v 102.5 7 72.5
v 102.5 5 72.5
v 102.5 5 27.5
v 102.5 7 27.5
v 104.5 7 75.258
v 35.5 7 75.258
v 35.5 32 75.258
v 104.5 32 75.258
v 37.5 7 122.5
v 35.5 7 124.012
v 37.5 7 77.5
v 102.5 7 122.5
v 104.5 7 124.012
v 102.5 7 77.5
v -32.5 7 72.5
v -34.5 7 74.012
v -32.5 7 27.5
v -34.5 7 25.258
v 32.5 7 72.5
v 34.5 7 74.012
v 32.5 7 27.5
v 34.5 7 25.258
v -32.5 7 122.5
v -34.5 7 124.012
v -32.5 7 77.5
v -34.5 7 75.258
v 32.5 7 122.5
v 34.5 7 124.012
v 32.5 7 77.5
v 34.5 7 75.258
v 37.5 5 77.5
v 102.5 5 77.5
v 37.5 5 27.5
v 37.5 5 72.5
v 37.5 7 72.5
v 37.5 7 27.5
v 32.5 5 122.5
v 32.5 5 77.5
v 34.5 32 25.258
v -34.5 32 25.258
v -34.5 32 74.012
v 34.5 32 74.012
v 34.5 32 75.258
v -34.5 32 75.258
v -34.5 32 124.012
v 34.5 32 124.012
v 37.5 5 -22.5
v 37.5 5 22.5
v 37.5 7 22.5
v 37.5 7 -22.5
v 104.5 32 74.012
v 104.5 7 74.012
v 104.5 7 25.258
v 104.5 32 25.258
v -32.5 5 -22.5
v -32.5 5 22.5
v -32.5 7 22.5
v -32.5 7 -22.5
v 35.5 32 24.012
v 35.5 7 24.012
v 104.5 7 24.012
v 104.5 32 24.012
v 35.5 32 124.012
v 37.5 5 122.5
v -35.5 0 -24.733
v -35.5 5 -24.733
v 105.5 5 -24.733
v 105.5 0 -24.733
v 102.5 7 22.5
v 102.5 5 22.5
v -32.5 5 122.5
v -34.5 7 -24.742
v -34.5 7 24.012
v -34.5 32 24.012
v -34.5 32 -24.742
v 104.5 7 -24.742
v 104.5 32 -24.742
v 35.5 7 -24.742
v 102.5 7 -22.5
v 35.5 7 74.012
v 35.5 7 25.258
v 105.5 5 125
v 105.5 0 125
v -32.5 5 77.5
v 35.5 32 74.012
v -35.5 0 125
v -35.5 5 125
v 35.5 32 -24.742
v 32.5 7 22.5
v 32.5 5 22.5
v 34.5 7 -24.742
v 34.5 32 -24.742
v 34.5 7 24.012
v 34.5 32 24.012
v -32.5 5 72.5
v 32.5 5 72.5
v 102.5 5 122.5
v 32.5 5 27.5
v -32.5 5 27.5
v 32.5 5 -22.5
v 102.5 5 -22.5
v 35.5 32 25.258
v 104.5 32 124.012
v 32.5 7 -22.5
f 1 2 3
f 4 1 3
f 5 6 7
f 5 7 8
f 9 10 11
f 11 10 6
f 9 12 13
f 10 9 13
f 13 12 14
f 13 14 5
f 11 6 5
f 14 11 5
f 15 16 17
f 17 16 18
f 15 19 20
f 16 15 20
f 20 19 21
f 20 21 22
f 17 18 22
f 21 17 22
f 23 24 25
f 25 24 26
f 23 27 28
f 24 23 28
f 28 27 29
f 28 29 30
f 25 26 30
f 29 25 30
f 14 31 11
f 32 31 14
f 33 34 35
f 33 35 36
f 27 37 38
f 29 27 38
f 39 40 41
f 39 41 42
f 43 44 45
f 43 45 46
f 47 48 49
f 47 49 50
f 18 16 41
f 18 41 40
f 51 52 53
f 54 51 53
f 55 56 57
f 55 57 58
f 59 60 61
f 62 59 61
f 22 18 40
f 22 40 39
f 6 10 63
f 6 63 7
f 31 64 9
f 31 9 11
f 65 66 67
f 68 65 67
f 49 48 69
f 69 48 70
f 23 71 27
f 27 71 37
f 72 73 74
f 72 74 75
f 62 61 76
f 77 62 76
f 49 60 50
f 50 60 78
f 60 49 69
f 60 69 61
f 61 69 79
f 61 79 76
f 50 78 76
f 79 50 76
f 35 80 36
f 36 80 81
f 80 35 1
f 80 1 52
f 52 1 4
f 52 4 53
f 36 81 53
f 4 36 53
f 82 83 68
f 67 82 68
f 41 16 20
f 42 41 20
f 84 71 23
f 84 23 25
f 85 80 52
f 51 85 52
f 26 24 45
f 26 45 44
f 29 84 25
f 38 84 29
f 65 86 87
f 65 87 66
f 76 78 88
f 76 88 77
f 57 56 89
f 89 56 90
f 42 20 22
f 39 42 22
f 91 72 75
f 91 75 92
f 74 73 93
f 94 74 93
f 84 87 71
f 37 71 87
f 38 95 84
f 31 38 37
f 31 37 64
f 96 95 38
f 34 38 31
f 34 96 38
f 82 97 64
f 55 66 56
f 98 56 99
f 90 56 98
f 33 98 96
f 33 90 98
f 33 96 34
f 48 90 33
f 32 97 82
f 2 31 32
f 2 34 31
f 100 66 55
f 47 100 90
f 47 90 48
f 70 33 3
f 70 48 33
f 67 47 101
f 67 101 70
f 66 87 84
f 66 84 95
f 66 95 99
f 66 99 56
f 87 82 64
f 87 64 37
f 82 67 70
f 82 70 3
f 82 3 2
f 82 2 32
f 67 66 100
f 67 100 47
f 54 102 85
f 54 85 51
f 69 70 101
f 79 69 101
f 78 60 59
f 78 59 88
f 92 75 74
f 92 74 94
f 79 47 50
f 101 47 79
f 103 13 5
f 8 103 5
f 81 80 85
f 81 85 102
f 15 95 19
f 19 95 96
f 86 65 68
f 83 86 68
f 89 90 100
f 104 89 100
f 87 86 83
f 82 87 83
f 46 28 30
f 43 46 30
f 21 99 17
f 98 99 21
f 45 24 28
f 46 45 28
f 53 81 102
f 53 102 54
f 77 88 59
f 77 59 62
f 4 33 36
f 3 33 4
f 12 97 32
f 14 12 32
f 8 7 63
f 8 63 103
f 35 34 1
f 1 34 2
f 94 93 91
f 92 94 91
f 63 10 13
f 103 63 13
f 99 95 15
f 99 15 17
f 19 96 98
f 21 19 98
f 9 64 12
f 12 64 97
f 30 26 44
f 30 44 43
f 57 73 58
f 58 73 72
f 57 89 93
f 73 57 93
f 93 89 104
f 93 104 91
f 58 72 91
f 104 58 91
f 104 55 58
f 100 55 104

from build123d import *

# Parameters (mm, degrees)
SKETCH1_W                 = 71
SKETCH1_H                 = 250
BOSS_EXTRUDE1_DEPTH       = 5
SKETCH2_W                 = 65
SKETCH2_H                 = 45
BOSS_EXTRUDE3_DEPTH       = 2
LPATTERN1_COUNT           = 3
LPATTERN1_PITCH           = 50
SKETCH3_W                 = 69
SKETCH3_H                 = 48.754858224
BOSS_EXTRUDE8_DEPTH       = 25
LPATTERN5_COUNT           = 3
LPATTERN5_PITCH           = 50
LPATTERN6_COUNT           = 2
LPATTERN6_PITCH           = 70
LPATTERN6_COPY_1_SKETCH_W = 65
LPATTERN6_COPY_1_SKETCH_H = 45
LPATTERN6_COPY_1_DEPTH    = 2
LPATTERN6_COPY_2_SKETCH_W = 65
LPATTERN6_COPY_2_SKETCH_H = 45
LPATTERN6_COPY_2_DEPTH    = 2
LPATTERN6_COPY_3_SKETCH_W = 69
LPATTERN6_COPY_3_SKETCH_H = 48.754858224
LPATTERN6_COPY_3_DEPTH    = 25
LPATTERN6_COPY_4_SKETCH_W = 69
LPATTERN6_COPY_4_SKETCH_H = 48.754858224
LPATTERN6_COPY_4_DEPTH    = 25
SKETCH6_W                 = 141
SKETCH6_H                 = 100.266772644
CUT_EXTRUDE1_DEPTH        = 10


with BuildPart() as part:
    # Sketch1 → Boss-Extrude1 (new body)
    with BuildSketch(Plane(origin=(0, 0, 0), x_dir=(1, 0, 0), z_dir=(0, 1, 0))):
        Rectangle(SKETCH1_W, SKETCH1_H)
    boss_extrude1 = extrude(amount=BOSS_EXTRUDE1_DEPTH)

    # Sketch2 → Boss-Extrude3 (add)
    with BuildSketch(Plane(origin=(0, 5, 0), x_dir=(1, 0, 0), z_dir=(0, 1, 0))):
        with Locations((0, -100)):
            Rectangle(SKETCH2_W, SKETCH2_H)
    boss_extrude3 = extrude(amount=BOSS_EXTRUDE3_DEPTH)

    # LPattern1: Boss-Extrude3 ×3
    with Locations(*[(0, 0, -i * LPATTERN1_PITCH) for i in range(1, LPATTERN1_COUNT)]):
        add(boss_extrude3)

    # Sketch3 → Boss-Extrude8 (add)
    with BuildSketch(Plane(origin=(0, 7, 0), x_dir=(1, 0, 0), z_dir=(0, 1, 0))):
        with Locations((0, -99.635002086)):
            Rectangle(SKETCH3_W, SKETCH3_H)
    boss_extrude8 = extrude(amount=BOSS_EXTRUDE8_DEPTH)

    # LPattern5: Boss-Extrude8 ×3
    with Locations(*[(0, 0, -i * LPATTERN5_PITCH) for i in range(1, LPATTERN5_COUNT)]):
        add(boss_extrude8)

    # LPattern6: Boss-Extrude1, Boss-Extrude3, Boss-Extrude8 ×2
    with Locations(*[(i * LPATTERN6_PITCH, 0, 0) for i in range(1, LPATTERN6_COUNT)]):
        add(boss_extrude1)
        add(boss_extrude3)
        add(boss_extrude8)

    # LPattern6 copy 1 sketch → LPattern6 copy 1 (add)
    with BuildSketch(Plane(origin=(70, 5, -50), x_dir=(1, 0, 0), z_dir=(0, 1, 0))):
        with Locations((0, -100)):
            Rectangle(LPATTERN6_COPY_1_SKETCH_W, LPATTERN6_COPY_1_SKETCH_H)
    extrude(amount=LPATTERN6_COPY_1_DEPTH)

    # LPattern6 copy 2 sketch → LPattern6 copy 2 (add)
    with BuildSketch(Plane(origin=(70, 5, -100), x_dir=(1, 0, 0), z_dir=(0, 1, 0))):
        with Locations((0, -100)):
            Rectangle(LPATTERN6_COPY_2_SKETCH_W, LPATTERN6_COPY_2_SKETCH_H)
    extrude(amount=LPATTERN6_COPY_2_DEPTH)

    # LPattern6 copy 3 sketch → LPattern6 copy 3 (add)
    with BuildSketch(Plane(origin=(70, 7, -50), x_dir=(1, 0, 0), z_dir=(0, 1, 0))):
        with Locations((0, -99.635002086)):
            Rectangle(LPATTERN6_COPY_3_SKETCH_W, LPATTERN6_COPY_3_SKETCH_H)
    extrude(amount=LPATTERN6_COPY_3_DEPTH)

    # LPattern6 copy 4 sketch → LPattern6 copy 4 (add)
    with BuildSketch(Plane(origin=(70, 7, -100), x_dir=(1, 0, 0), z_dir=(0, 1, 0))):
        with Locations((0, -99.635002086)):
            Rectangle(LPATTERN6_COPY_4_SKETCH_W, LPATTERN6_COPY_4_SKETCH_H)
    extrude(amount=LPATTERN6_COPY_4_DEPTH)

    # Sketch6 → Cut-Extrude1 (cut)
    with BuildSketch(Plane(origin=(0, 5, 0), x_dir=(1, 0, 0), z_dir=(0, 1, 0))):
        with Locations((35, 74.866613678)):
            Rectangle(SKETCH6_W, SKETCH6_H)
    extrude(amount=-CUT_EXTRUDE1_DEPTH, mode=Mode.SUBTRACT)


solid = part.part
